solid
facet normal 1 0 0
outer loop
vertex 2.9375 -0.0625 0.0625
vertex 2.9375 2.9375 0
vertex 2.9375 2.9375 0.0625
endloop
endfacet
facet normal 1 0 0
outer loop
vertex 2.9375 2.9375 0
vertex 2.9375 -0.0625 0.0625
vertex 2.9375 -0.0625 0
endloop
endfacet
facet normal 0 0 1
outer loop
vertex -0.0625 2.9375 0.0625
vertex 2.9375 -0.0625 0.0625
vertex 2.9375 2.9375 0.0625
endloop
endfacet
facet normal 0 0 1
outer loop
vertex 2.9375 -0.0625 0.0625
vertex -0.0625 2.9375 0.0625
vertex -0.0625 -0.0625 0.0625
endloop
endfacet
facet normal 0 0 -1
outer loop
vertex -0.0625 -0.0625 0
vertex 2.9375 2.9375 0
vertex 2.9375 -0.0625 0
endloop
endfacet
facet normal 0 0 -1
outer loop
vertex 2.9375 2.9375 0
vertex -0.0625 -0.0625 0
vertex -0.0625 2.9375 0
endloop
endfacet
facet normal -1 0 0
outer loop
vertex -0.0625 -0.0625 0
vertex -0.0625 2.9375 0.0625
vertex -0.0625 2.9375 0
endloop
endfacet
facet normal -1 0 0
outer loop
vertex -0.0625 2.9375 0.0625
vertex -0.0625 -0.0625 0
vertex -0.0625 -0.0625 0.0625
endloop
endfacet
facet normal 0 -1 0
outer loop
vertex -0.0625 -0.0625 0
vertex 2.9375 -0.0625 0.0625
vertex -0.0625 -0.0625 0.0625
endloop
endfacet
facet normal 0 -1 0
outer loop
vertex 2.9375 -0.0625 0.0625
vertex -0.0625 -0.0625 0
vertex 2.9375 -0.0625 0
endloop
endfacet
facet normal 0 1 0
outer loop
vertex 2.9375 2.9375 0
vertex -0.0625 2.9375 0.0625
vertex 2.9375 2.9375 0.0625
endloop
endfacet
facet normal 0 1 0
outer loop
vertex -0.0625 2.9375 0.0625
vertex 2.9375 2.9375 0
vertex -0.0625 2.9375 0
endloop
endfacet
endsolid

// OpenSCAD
// element10.scad
// Units: inches

plate_w = 2 + 7/8;
plate_d = 2 + 7/8;
plate_h = 1/16;

hole_d = 3/32;
hole_r = hole_d / 2;

module rivet_holes() {
    // 10 holes per side; inset = half the spacing so holes form a clean frame
    spacing_x = plate_w / 10;
    spacing_y = plate_d / 10;
    inset_x   = spacing_x / 2;
    inset_y   = spacing_y / 2;

    // Front edge
    for (i = [0:9])
        translate([inset_x + i * spacing_x, inset_y, -1])
            cylinder(h = plate_h + 2, r = hole_r, $fn = 20);

    // Back edge
    for (i = [0:9])
        translate([inset_x + i * spacing_x, plate_d - inset_y, -1])
            cylinder(h = plate_h + 2, r = hole_r, $fn = 20);

    // Left edge
    for (i = [0:9])
        translate([inset_x, inset_y + i * spacing_y, -1])
            cylinder(h = plate_h + 2, r = hole_r, $fn = 20);

    // Right edge
    for (i = [0:9])
        translate([plate_w - inset_x, inset_y + i * spacing_y, -1])
            cylinder(h = plate_h + 2, r = hole_r, $fn = 20);
}

rivet_h = plate_h;

module rivets() {
    spacing_x = plate_w / 10;
    spacing_y = plate_d / 10;
    inset_x   = spacing_x / 2;
    inset_y   = spacing_y / 2;

    color("lightgray") {

        // Front edge
        for (i = [0:9])
            translate([inset_x + i * spacing_x, inset_y, 0])
                cylinder(h = rivet_h, r = hole_r, $fn = 20);

        // Back edge
        for (i = [0:9])
            translate([inset_x + i * spacing_x, plate_d - inset_y, 0])
                cylinder(h = rivet_h, r = hole_r, $fn = 20);

        // Left edge
        for (i = [0:9])
            translate([inset_x, inset_y + i * spacing_y, 0])
                cylinder(h = rivet_h, r = hole_r, $fn = 20);

        // Right edge
        for (i = [0:9])
            translate([plate_w - inset_x, inset_y + i * spacing_y, 0])
                cylinder(h = rivet_h, r = hole_r, $fn = 20);
    }
}

frame_w = 1/16;

// Roller slots
roller_count  = 11;
roller_h_size = 3/16;   // top-to-bottom thickness of each roller slot
roller_r      = roller_h_size / 2;

// Available space inside rivet frame (same inset as rivet spacing)
roller_inset_x = (plate_w / 10) / 2;
roller_inset_y = (plate_d / 10) / 2;
roller_zone_w  = plate_w - 2 * roller_inset_x;
roller_zone_d  = plate_d - 2 * roller_inset_y;

// Gap between rollers: split remaining vertical space evenly across 12 gaps
roller_gap = (roller_zone_d - roller_count * roller_h_size) / (roller_count + 1);

module frame_with_id(colors = []) {
    id_cover = plate_h / 8;
    region_w = (plate_w + 2 * frame_w) / 6;
    mark_h   = plate_h - id_cover;

    color("black")
    difference() {
        translate([-frame_w, -frame_w, 0])
            cube([plate_w + 2 * frame_w, plate_d + 2 * frame_w, plate_h]);
        translate([0, 0, -0.001])
            cube([plate_w, plate_d, plate_h + 0.002]);
        translate([-frame_w, plate_d, -0.001])
            cube([plate_w + 2 * frame_w, frame_w + 0.002, plate_h + 0.002]);
    }

    for (i = [0:5]) {
        c = (colors[i] != undef) ? colors[i] : "black";
        color(c)
        translate([-frame_w + i * region_w, plate_d, 0])
            cube([region_w, frame_w, mark_h]);
        color("black")
        translate([-frame_w + i * region_w, plate_d, mark_h])
            cube([region_w, frame_w, id_cover]);
    }
}

module plate() {
    difference() {
        color("darkgray")
            cube([plate_w, plate_d, plate_h]);
        rivet_holes();
    }
}

frame_with_id(["lightgray", "lightgray", undef, undef, "lightgray", "lightgray"]);
plate();
rivets();
